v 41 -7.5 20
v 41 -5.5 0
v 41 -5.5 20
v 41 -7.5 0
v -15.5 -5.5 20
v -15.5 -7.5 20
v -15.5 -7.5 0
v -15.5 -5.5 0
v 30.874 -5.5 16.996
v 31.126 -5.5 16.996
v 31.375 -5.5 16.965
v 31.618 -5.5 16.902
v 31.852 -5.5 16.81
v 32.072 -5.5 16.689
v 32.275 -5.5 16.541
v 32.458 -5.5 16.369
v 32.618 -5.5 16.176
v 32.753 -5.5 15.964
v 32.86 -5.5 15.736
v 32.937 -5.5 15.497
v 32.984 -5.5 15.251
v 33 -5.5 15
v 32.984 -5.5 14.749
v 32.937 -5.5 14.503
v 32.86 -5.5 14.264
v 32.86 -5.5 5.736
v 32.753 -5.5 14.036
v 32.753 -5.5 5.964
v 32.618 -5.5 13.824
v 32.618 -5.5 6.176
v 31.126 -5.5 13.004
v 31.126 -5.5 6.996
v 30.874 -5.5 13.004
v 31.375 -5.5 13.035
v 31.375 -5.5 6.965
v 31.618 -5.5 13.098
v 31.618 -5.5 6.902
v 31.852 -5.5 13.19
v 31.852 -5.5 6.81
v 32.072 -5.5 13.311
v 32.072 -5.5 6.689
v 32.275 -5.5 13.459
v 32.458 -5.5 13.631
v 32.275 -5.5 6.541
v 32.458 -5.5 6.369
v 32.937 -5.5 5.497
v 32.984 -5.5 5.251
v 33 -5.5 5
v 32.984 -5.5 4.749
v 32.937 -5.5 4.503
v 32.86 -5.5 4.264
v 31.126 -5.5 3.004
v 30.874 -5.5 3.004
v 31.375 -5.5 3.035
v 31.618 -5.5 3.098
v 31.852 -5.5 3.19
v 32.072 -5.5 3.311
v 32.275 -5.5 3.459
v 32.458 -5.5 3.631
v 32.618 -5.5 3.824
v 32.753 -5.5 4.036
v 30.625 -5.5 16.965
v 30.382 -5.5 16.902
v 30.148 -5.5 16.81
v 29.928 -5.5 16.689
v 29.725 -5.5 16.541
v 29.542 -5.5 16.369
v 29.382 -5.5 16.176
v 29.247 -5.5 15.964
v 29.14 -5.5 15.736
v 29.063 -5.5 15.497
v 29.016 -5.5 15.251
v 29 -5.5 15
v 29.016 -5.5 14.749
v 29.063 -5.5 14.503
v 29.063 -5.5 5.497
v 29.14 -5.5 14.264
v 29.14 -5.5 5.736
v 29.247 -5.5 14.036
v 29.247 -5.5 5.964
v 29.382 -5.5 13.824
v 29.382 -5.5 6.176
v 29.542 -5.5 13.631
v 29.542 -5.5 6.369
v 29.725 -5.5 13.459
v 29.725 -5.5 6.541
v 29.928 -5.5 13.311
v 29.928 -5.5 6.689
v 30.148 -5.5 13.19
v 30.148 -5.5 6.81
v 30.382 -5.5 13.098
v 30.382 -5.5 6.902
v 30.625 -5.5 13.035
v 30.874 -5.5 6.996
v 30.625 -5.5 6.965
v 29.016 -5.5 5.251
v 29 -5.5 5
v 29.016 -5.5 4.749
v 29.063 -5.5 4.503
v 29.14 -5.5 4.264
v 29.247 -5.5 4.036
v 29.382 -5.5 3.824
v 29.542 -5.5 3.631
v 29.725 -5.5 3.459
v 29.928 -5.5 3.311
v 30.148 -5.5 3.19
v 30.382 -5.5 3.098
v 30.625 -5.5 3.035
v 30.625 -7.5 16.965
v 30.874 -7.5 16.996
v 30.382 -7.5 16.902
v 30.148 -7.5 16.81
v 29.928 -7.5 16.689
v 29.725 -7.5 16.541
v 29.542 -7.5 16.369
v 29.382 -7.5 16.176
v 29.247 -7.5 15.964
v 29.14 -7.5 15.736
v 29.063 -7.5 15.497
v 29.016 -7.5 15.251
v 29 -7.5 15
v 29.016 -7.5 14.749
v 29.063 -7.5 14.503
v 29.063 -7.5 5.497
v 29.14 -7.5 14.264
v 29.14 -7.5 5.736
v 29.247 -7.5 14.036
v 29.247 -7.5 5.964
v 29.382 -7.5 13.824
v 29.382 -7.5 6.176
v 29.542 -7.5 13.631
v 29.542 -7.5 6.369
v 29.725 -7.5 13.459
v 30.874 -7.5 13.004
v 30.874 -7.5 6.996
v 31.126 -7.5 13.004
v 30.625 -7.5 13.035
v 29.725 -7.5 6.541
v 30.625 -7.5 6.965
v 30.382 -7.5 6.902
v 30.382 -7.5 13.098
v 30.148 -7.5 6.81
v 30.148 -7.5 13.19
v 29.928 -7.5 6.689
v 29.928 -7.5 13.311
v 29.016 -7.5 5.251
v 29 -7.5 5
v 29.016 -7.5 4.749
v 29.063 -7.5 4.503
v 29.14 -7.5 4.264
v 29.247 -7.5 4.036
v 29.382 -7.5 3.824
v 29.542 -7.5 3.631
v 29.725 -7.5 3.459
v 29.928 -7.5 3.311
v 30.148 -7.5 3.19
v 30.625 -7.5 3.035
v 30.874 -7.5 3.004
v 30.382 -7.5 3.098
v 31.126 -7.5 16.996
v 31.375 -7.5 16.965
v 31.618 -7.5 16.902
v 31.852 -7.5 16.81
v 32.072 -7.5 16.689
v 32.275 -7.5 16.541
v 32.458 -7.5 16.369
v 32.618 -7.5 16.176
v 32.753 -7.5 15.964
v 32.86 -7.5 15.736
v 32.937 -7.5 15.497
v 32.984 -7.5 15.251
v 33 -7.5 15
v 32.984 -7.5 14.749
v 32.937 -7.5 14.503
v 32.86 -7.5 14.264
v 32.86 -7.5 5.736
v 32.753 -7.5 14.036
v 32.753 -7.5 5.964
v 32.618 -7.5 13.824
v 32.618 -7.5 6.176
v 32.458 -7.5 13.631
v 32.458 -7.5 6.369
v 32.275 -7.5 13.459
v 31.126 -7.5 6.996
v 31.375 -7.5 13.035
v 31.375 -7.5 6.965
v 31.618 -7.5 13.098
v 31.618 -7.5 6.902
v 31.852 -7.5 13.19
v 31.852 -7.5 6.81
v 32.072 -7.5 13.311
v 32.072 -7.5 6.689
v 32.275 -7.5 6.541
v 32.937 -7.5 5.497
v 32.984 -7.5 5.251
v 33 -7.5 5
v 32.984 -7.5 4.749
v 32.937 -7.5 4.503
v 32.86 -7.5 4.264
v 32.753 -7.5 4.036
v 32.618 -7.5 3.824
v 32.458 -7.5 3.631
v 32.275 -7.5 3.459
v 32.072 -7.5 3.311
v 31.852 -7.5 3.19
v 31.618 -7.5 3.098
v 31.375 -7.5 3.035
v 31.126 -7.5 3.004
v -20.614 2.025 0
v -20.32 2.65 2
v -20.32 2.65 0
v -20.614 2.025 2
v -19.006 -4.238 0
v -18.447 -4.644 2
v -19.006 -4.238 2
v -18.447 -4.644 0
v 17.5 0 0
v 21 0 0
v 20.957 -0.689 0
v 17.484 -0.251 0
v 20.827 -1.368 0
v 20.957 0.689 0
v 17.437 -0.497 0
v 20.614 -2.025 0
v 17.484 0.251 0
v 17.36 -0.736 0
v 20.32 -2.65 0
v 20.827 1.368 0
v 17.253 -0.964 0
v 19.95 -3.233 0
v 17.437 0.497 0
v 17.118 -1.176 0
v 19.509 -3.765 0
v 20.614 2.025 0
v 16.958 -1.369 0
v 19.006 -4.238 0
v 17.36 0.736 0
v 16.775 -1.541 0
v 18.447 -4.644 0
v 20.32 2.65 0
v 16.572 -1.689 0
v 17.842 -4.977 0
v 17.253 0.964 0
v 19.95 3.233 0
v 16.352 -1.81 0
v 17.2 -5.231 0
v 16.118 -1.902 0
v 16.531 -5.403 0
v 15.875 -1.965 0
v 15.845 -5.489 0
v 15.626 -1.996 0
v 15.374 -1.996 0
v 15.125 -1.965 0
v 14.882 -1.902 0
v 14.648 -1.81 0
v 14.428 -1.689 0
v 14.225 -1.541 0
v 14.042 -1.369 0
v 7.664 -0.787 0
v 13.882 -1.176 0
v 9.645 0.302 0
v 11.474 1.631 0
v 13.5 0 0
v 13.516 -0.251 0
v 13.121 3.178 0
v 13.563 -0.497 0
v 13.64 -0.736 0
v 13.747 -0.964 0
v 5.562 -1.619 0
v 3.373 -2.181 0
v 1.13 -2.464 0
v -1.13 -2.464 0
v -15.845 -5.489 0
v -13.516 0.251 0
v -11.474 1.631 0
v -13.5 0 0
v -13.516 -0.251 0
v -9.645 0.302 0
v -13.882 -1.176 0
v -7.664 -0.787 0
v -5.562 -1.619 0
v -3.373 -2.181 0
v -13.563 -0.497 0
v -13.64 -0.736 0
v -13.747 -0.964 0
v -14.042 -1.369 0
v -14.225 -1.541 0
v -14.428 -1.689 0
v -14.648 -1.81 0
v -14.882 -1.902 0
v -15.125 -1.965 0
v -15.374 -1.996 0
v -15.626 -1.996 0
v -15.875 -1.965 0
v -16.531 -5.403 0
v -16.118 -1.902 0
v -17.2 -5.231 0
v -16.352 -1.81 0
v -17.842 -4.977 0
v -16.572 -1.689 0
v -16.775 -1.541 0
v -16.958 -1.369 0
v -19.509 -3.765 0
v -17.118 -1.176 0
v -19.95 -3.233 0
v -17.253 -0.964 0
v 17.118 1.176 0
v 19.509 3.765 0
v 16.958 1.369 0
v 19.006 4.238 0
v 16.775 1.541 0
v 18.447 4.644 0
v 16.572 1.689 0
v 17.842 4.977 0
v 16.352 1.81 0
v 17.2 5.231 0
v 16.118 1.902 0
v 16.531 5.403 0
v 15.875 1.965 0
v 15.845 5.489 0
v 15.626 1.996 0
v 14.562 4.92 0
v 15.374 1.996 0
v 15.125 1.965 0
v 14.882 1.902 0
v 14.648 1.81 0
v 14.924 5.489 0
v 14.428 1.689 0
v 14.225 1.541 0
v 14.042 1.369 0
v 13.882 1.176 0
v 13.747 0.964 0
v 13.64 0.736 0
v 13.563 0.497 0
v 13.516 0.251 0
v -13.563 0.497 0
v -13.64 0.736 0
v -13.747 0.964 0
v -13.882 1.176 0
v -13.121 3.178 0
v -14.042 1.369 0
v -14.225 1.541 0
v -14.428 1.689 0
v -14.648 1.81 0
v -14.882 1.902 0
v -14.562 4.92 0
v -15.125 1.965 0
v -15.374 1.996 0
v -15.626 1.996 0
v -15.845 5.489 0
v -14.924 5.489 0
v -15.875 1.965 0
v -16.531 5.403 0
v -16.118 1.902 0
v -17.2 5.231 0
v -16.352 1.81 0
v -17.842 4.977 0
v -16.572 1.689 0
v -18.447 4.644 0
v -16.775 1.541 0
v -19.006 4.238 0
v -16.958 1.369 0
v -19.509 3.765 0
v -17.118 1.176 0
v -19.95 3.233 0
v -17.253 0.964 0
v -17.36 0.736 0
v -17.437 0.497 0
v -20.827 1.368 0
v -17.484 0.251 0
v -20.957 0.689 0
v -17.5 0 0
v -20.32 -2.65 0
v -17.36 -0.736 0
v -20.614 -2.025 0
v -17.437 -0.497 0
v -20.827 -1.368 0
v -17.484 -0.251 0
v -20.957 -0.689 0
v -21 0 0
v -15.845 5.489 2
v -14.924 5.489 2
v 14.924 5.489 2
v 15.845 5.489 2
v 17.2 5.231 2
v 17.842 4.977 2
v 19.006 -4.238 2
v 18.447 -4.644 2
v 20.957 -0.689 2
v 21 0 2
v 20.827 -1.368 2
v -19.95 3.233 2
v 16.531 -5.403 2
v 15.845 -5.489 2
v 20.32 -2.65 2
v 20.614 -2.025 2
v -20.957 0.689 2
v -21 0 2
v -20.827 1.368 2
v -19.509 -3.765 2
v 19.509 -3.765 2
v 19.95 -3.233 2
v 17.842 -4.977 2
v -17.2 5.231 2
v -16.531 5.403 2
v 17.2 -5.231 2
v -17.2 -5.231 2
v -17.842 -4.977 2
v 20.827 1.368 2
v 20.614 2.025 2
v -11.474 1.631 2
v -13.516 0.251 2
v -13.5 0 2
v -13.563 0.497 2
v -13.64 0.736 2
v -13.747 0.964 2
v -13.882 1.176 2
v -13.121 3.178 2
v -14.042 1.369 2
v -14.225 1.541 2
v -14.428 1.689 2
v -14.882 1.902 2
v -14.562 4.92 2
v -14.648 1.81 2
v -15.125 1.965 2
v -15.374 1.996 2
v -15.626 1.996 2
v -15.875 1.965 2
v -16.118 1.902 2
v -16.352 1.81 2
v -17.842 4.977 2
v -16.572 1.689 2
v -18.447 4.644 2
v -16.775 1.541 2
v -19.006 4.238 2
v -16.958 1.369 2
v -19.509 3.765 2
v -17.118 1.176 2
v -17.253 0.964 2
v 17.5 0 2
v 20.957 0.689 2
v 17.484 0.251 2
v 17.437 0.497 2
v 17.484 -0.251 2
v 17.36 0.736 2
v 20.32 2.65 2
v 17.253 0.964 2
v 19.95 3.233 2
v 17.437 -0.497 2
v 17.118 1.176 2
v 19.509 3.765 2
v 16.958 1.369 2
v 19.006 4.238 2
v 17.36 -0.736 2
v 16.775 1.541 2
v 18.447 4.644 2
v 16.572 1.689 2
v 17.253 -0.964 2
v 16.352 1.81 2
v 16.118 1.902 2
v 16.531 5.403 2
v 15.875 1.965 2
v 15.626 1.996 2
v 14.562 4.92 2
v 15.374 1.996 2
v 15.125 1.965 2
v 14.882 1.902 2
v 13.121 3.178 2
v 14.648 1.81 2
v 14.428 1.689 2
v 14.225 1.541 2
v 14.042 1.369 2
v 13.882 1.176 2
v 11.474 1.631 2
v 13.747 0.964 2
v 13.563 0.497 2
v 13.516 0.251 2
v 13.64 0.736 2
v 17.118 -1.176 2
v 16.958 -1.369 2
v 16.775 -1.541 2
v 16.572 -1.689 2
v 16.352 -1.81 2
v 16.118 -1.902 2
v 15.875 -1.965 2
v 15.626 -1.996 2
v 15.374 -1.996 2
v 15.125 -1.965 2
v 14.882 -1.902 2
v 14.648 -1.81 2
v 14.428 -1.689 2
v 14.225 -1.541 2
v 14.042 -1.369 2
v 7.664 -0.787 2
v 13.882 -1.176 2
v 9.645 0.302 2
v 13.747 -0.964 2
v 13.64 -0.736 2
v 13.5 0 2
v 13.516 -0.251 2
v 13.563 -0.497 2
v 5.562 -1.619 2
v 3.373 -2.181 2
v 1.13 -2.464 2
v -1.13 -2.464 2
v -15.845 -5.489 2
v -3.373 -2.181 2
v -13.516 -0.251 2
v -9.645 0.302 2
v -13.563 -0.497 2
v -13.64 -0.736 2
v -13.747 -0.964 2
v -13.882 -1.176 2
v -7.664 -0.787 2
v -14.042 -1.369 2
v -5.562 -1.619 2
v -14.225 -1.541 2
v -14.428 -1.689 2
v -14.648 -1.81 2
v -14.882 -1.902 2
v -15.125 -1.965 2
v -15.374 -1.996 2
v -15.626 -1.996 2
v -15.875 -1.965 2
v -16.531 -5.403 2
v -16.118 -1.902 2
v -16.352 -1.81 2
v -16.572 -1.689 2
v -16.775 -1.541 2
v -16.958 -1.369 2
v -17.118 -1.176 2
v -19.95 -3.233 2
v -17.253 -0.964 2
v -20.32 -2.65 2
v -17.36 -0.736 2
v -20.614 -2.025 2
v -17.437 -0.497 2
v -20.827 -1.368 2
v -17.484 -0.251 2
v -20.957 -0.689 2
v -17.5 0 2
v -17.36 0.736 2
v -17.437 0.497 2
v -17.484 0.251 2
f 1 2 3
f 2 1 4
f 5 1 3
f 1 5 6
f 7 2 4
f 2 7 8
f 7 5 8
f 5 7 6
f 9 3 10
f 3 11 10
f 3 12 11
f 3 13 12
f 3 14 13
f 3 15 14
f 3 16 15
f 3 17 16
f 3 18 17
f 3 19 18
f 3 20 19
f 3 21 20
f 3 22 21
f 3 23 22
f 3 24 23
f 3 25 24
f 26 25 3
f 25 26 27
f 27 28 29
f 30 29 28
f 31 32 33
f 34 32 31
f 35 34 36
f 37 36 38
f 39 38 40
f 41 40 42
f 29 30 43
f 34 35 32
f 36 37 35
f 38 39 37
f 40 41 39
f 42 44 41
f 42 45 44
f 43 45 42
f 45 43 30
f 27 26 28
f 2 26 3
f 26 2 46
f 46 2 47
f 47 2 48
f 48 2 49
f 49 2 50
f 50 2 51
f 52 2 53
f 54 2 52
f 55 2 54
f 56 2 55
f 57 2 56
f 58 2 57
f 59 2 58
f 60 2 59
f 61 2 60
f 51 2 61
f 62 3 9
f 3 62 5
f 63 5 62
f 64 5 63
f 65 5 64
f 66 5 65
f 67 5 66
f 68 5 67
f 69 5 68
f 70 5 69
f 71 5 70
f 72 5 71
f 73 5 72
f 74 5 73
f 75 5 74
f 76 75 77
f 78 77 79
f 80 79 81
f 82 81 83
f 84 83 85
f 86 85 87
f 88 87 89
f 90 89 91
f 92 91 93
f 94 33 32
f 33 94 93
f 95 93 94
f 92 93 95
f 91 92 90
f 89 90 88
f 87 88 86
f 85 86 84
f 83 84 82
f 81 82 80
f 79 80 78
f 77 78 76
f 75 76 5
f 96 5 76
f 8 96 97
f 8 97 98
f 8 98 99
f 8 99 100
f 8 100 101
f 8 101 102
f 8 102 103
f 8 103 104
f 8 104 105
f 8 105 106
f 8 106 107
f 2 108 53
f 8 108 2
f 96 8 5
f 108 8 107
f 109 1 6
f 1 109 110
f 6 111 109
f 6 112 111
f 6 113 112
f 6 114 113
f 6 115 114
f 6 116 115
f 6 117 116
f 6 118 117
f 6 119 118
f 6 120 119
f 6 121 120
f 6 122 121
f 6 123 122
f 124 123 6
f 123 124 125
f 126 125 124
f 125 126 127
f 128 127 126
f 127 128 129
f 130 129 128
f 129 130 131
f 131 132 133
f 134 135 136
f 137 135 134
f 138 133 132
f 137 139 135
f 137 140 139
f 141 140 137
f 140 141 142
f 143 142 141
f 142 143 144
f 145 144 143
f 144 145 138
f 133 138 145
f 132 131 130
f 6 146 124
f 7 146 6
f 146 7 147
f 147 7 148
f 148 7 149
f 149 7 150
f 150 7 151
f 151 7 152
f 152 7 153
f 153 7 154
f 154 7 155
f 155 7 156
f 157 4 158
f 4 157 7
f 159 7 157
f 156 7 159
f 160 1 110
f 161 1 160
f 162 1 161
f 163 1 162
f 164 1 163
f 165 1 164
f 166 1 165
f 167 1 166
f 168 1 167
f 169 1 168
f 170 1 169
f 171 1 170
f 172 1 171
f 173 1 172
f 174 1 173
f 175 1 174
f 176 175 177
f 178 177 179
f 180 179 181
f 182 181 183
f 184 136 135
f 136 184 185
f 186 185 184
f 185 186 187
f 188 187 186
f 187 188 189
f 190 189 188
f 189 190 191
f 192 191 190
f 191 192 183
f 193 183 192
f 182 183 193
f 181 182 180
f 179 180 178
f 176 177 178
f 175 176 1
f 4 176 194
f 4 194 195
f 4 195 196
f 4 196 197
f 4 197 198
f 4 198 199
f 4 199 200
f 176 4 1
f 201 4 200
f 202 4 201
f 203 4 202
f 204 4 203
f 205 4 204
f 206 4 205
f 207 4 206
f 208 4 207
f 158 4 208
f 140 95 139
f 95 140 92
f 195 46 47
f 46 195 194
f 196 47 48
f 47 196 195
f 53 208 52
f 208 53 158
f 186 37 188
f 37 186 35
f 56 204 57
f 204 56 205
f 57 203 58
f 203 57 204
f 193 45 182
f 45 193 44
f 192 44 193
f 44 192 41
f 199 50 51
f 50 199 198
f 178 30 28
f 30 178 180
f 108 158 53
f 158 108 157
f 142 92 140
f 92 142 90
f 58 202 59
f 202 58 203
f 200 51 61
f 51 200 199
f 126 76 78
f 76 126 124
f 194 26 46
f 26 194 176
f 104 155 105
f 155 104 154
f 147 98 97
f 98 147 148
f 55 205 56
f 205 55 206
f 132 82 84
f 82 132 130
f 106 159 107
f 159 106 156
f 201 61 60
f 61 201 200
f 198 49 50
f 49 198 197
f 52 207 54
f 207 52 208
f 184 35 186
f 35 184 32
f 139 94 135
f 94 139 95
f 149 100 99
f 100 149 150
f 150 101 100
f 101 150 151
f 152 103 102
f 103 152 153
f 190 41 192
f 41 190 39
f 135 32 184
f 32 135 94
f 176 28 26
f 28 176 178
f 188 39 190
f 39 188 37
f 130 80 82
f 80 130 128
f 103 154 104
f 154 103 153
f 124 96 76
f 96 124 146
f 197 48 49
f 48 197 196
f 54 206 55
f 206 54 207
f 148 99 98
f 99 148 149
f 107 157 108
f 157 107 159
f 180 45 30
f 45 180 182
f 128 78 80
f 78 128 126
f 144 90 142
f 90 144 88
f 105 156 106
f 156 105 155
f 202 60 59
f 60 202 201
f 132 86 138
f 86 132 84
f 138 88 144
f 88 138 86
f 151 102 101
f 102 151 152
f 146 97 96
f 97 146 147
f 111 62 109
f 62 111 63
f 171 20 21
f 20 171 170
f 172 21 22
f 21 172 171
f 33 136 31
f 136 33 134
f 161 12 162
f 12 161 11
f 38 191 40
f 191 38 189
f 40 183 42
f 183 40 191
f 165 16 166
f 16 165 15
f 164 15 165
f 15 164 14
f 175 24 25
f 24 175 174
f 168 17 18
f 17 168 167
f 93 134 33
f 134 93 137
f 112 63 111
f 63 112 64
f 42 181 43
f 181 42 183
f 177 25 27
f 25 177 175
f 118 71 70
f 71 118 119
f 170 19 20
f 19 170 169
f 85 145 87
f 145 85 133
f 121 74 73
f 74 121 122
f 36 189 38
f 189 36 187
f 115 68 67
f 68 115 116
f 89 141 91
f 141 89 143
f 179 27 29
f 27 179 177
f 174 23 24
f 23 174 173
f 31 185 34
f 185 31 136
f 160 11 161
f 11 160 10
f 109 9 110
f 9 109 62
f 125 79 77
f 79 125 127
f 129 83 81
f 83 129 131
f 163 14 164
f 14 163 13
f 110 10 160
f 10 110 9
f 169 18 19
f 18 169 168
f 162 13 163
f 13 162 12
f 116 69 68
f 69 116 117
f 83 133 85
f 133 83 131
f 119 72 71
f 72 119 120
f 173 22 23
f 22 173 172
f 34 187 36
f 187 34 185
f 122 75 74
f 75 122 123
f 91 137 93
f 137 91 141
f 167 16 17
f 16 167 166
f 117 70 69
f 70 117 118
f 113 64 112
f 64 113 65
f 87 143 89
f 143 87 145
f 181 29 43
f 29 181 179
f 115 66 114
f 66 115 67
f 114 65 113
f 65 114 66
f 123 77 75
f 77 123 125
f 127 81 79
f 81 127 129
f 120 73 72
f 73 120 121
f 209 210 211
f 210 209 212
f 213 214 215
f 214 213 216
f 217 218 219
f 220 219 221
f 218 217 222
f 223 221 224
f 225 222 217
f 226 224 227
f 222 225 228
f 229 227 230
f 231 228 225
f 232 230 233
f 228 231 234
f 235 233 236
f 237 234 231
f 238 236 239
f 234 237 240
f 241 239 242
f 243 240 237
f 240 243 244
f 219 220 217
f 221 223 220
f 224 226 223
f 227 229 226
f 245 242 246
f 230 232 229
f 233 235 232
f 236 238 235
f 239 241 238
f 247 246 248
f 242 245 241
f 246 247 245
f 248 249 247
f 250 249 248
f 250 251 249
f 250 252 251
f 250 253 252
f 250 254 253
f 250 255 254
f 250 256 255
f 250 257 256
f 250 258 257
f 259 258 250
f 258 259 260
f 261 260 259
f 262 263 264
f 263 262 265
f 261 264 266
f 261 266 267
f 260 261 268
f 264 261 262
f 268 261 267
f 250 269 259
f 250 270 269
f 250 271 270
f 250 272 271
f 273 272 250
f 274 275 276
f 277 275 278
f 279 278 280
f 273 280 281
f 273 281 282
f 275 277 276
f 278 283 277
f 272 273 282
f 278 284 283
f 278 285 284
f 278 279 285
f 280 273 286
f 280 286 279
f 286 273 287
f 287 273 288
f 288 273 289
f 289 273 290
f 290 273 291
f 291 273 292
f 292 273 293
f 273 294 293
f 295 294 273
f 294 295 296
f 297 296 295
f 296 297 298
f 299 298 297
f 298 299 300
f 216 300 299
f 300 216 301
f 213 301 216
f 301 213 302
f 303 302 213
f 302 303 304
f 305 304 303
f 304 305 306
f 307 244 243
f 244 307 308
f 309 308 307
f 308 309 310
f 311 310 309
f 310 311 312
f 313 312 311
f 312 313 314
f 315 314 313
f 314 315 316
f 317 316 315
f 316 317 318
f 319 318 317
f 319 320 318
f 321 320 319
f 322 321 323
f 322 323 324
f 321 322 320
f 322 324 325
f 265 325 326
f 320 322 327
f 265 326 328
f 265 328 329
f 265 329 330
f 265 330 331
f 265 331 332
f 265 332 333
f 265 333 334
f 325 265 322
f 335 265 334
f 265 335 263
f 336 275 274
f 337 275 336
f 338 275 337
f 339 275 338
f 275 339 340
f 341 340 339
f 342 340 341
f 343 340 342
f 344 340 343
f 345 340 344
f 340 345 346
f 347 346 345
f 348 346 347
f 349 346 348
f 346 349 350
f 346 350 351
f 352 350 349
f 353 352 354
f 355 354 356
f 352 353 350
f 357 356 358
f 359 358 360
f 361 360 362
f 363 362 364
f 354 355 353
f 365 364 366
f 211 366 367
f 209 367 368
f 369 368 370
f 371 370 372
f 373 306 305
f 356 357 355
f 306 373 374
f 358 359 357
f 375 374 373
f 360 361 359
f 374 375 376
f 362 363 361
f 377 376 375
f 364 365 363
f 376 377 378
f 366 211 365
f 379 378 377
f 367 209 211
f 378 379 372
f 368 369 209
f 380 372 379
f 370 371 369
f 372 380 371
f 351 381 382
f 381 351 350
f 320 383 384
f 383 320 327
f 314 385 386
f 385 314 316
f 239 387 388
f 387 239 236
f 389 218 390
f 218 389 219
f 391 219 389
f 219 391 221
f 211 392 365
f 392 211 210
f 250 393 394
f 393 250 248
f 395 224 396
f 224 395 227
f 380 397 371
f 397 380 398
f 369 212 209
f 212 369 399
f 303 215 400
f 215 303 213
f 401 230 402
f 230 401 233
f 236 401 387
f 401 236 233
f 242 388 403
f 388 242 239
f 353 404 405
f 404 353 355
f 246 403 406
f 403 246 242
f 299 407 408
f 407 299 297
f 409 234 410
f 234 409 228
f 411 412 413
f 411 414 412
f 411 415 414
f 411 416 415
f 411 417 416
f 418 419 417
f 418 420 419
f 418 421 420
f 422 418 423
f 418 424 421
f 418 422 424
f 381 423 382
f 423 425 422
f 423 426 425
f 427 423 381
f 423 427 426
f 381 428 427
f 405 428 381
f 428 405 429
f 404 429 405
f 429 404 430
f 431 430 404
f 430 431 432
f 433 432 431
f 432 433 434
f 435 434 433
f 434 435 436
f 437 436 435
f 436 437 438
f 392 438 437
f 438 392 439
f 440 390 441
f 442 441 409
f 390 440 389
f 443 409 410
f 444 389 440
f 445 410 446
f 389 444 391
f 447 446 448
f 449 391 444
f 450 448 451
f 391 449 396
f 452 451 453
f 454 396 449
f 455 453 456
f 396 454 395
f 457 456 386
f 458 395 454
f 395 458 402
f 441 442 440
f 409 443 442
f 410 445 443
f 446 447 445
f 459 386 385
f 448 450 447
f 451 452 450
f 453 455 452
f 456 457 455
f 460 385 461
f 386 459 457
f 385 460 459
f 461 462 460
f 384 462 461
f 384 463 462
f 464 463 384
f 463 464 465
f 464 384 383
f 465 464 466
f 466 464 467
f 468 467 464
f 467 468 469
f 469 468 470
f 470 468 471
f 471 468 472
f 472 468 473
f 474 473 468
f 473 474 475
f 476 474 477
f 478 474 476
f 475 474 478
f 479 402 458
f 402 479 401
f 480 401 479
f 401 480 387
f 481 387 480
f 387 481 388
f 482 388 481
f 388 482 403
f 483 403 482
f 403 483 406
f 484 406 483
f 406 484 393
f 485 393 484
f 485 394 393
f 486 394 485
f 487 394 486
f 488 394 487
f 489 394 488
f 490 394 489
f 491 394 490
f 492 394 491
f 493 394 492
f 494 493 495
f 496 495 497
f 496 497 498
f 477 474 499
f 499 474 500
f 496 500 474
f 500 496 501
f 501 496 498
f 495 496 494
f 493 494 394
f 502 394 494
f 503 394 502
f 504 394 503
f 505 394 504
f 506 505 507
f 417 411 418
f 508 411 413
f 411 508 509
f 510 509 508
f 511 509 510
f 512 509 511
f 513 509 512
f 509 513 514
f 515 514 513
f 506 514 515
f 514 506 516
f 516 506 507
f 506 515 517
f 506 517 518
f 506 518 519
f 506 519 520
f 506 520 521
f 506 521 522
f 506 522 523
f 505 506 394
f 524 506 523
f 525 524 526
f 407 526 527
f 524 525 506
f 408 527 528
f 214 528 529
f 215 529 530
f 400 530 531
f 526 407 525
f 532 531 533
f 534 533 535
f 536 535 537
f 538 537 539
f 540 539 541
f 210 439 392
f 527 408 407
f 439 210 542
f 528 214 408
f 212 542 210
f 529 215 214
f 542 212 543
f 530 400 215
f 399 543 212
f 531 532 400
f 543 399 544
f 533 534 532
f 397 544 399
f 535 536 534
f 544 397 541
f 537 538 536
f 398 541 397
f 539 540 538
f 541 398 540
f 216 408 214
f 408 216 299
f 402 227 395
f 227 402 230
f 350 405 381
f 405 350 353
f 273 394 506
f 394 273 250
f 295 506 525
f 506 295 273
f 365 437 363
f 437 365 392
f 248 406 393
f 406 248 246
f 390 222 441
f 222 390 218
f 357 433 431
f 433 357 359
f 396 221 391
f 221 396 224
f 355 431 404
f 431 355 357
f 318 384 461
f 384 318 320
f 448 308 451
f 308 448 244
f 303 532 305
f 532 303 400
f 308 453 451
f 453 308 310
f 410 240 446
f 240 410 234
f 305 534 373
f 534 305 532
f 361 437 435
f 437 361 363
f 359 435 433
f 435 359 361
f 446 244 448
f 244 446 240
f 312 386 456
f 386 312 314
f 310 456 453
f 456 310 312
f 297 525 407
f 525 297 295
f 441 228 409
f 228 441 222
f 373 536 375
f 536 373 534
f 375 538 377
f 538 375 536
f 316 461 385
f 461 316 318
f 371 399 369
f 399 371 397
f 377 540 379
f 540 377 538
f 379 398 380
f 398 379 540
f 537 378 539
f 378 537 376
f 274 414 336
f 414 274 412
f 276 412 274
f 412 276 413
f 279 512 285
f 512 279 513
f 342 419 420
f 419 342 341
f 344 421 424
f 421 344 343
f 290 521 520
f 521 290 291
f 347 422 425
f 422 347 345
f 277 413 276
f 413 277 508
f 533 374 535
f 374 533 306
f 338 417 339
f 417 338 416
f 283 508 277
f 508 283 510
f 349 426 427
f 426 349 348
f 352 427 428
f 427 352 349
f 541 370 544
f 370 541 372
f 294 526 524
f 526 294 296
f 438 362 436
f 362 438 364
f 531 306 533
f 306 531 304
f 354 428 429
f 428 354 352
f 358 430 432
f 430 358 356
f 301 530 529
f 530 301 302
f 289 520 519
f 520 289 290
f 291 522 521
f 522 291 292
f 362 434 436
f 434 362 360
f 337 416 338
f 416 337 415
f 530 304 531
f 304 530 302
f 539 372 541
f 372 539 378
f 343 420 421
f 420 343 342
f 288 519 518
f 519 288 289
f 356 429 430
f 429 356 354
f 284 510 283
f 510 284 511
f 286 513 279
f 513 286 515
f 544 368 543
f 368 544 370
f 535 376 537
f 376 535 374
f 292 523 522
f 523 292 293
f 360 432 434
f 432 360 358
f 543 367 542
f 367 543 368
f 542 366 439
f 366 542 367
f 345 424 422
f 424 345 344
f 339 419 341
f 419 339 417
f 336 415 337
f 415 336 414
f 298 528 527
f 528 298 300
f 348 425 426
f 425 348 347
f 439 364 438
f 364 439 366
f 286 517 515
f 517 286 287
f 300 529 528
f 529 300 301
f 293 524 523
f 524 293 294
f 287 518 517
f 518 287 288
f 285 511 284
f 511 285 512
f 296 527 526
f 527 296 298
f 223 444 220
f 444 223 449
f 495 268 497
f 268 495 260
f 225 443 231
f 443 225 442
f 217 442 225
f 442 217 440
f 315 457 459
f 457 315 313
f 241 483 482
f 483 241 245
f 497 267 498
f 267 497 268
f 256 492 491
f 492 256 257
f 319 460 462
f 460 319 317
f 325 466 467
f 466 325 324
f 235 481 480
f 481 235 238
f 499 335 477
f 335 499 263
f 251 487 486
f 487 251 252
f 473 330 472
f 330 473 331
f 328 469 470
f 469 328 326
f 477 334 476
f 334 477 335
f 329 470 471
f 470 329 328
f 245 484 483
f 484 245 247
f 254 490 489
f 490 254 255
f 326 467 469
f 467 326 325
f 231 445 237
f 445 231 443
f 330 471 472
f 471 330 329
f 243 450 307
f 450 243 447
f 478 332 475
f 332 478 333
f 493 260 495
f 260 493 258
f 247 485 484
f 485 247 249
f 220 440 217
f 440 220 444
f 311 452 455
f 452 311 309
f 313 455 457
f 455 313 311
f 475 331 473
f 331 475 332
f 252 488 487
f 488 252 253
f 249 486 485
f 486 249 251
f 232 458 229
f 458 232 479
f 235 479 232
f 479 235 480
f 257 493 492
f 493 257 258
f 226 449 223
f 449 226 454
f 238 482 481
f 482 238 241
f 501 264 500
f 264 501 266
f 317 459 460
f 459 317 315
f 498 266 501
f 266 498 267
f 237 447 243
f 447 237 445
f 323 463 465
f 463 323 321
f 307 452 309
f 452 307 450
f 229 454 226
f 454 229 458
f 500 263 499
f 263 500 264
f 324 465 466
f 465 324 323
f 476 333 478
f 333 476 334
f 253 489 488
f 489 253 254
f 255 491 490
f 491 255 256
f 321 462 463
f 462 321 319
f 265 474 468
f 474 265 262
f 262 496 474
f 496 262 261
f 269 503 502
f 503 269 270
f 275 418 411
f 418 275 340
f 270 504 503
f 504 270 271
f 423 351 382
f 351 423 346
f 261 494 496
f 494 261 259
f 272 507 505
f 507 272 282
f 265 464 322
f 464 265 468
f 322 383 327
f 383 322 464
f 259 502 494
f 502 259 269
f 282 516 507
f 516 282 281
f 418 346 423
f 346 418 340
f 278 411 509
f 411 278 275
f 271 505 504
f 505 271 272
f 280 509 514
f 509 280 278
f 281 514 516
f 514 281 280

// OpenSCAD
MOTOR_WIDTH = 42;

MOUNT_HOLE_DIA = 4;
MOUNT_HOLE_SPACING = 31;
MOUNT_HOLE_OFFSET = (MOTOR_WIDTH - MOUNT_HOLE_SPACING)/2;
MOUNT_SHAFT_DIA = MOTOR_WIDTH - 2 * 3;
MOUNT_DIA = MOUNT_HOLE_OFFSET * 2;
MOUNT_THICKNESS = 2;

BAR_WIDTH = 20;
BAR_LENGTH = (MOTOR_WIDTH + MOUNT_HOLE_SPACING)/2 + BAR_WIDTH;
BAR_HOLE_DIA = 4;
BAR_HOLE_SPACING = 10;
BAR_HOLE_OFFSET = (MOTOR_WIDTH + MOUNT_HOLE_SPACING)/2 + BAR_WIDTH/2;
$fn = 50;

module bar() {
  difference() {
    translate([-MOUNT_HOLE_SPACING/2, -MOUNT_HOLE_OFFSET - MOUNT_THICKNESS, 0])
    cube(size = [BAR_LENGTH, MOUNT_THICKNESS, BAR_WIDTH]);
    
    translate([BAR_HOLE_OFFSET - MOUNT_HOLE_SPACING/2, -MOUNT_HOLE_OFFSET, BAR_WIDTH/2 - BAR_HOLE_SPACING/2])
    rotate([90, 0, 0])
    cylinder(d = BAR_HOLE_DIA, h = MOUNT_THICKNESS);

    translate([BAR_HOLE_OFFSET - MOUNT_HOLE_SPACING/2, -MOUNT_HOLE_OFFSET, BAR_WIDTH/2 + BAR_HOLE_SPACING/2])
    rotate([90, 0, 0])
    cylinder(d = BAR_HOLE_DIA, h = MOUNT_THICKNESS);
  }
}

module mount() {
  difference() {
    union() {
      hull() {
        translate([-MOUNT_HOLE_SPACING/2, 0, 0])
        cylinder(d = MOUNT_DIA, h = MOUNT_THICKNESS);
        
        translate([MOUNT_HOLE_SPACING/2, 0, 0])
        cylinder(d = MOUNT_DIA, h = MOUNT_THICKNESS);
      }

      bar();
    }
    translate([-MOUNT_HOLE_SPACING/2, 0, 0])
    cylinder(d = MOUNT_HOLE_DIA, h = MOUNT_THICKNESS);
    
    translate([MOUNT_HOLE_SPACING/2, 0, 0])
    cylinder(d = MOUNT_HOLE_DIA, h = MOUNT_THICKNESS);

    translate([0, MOUNT_HOLE_SPACING/2, 0])
    cylinder(d = MOUNT_SHAFT_DIA, h = MOUNT_THICKNESS);
  }
}

mount();
